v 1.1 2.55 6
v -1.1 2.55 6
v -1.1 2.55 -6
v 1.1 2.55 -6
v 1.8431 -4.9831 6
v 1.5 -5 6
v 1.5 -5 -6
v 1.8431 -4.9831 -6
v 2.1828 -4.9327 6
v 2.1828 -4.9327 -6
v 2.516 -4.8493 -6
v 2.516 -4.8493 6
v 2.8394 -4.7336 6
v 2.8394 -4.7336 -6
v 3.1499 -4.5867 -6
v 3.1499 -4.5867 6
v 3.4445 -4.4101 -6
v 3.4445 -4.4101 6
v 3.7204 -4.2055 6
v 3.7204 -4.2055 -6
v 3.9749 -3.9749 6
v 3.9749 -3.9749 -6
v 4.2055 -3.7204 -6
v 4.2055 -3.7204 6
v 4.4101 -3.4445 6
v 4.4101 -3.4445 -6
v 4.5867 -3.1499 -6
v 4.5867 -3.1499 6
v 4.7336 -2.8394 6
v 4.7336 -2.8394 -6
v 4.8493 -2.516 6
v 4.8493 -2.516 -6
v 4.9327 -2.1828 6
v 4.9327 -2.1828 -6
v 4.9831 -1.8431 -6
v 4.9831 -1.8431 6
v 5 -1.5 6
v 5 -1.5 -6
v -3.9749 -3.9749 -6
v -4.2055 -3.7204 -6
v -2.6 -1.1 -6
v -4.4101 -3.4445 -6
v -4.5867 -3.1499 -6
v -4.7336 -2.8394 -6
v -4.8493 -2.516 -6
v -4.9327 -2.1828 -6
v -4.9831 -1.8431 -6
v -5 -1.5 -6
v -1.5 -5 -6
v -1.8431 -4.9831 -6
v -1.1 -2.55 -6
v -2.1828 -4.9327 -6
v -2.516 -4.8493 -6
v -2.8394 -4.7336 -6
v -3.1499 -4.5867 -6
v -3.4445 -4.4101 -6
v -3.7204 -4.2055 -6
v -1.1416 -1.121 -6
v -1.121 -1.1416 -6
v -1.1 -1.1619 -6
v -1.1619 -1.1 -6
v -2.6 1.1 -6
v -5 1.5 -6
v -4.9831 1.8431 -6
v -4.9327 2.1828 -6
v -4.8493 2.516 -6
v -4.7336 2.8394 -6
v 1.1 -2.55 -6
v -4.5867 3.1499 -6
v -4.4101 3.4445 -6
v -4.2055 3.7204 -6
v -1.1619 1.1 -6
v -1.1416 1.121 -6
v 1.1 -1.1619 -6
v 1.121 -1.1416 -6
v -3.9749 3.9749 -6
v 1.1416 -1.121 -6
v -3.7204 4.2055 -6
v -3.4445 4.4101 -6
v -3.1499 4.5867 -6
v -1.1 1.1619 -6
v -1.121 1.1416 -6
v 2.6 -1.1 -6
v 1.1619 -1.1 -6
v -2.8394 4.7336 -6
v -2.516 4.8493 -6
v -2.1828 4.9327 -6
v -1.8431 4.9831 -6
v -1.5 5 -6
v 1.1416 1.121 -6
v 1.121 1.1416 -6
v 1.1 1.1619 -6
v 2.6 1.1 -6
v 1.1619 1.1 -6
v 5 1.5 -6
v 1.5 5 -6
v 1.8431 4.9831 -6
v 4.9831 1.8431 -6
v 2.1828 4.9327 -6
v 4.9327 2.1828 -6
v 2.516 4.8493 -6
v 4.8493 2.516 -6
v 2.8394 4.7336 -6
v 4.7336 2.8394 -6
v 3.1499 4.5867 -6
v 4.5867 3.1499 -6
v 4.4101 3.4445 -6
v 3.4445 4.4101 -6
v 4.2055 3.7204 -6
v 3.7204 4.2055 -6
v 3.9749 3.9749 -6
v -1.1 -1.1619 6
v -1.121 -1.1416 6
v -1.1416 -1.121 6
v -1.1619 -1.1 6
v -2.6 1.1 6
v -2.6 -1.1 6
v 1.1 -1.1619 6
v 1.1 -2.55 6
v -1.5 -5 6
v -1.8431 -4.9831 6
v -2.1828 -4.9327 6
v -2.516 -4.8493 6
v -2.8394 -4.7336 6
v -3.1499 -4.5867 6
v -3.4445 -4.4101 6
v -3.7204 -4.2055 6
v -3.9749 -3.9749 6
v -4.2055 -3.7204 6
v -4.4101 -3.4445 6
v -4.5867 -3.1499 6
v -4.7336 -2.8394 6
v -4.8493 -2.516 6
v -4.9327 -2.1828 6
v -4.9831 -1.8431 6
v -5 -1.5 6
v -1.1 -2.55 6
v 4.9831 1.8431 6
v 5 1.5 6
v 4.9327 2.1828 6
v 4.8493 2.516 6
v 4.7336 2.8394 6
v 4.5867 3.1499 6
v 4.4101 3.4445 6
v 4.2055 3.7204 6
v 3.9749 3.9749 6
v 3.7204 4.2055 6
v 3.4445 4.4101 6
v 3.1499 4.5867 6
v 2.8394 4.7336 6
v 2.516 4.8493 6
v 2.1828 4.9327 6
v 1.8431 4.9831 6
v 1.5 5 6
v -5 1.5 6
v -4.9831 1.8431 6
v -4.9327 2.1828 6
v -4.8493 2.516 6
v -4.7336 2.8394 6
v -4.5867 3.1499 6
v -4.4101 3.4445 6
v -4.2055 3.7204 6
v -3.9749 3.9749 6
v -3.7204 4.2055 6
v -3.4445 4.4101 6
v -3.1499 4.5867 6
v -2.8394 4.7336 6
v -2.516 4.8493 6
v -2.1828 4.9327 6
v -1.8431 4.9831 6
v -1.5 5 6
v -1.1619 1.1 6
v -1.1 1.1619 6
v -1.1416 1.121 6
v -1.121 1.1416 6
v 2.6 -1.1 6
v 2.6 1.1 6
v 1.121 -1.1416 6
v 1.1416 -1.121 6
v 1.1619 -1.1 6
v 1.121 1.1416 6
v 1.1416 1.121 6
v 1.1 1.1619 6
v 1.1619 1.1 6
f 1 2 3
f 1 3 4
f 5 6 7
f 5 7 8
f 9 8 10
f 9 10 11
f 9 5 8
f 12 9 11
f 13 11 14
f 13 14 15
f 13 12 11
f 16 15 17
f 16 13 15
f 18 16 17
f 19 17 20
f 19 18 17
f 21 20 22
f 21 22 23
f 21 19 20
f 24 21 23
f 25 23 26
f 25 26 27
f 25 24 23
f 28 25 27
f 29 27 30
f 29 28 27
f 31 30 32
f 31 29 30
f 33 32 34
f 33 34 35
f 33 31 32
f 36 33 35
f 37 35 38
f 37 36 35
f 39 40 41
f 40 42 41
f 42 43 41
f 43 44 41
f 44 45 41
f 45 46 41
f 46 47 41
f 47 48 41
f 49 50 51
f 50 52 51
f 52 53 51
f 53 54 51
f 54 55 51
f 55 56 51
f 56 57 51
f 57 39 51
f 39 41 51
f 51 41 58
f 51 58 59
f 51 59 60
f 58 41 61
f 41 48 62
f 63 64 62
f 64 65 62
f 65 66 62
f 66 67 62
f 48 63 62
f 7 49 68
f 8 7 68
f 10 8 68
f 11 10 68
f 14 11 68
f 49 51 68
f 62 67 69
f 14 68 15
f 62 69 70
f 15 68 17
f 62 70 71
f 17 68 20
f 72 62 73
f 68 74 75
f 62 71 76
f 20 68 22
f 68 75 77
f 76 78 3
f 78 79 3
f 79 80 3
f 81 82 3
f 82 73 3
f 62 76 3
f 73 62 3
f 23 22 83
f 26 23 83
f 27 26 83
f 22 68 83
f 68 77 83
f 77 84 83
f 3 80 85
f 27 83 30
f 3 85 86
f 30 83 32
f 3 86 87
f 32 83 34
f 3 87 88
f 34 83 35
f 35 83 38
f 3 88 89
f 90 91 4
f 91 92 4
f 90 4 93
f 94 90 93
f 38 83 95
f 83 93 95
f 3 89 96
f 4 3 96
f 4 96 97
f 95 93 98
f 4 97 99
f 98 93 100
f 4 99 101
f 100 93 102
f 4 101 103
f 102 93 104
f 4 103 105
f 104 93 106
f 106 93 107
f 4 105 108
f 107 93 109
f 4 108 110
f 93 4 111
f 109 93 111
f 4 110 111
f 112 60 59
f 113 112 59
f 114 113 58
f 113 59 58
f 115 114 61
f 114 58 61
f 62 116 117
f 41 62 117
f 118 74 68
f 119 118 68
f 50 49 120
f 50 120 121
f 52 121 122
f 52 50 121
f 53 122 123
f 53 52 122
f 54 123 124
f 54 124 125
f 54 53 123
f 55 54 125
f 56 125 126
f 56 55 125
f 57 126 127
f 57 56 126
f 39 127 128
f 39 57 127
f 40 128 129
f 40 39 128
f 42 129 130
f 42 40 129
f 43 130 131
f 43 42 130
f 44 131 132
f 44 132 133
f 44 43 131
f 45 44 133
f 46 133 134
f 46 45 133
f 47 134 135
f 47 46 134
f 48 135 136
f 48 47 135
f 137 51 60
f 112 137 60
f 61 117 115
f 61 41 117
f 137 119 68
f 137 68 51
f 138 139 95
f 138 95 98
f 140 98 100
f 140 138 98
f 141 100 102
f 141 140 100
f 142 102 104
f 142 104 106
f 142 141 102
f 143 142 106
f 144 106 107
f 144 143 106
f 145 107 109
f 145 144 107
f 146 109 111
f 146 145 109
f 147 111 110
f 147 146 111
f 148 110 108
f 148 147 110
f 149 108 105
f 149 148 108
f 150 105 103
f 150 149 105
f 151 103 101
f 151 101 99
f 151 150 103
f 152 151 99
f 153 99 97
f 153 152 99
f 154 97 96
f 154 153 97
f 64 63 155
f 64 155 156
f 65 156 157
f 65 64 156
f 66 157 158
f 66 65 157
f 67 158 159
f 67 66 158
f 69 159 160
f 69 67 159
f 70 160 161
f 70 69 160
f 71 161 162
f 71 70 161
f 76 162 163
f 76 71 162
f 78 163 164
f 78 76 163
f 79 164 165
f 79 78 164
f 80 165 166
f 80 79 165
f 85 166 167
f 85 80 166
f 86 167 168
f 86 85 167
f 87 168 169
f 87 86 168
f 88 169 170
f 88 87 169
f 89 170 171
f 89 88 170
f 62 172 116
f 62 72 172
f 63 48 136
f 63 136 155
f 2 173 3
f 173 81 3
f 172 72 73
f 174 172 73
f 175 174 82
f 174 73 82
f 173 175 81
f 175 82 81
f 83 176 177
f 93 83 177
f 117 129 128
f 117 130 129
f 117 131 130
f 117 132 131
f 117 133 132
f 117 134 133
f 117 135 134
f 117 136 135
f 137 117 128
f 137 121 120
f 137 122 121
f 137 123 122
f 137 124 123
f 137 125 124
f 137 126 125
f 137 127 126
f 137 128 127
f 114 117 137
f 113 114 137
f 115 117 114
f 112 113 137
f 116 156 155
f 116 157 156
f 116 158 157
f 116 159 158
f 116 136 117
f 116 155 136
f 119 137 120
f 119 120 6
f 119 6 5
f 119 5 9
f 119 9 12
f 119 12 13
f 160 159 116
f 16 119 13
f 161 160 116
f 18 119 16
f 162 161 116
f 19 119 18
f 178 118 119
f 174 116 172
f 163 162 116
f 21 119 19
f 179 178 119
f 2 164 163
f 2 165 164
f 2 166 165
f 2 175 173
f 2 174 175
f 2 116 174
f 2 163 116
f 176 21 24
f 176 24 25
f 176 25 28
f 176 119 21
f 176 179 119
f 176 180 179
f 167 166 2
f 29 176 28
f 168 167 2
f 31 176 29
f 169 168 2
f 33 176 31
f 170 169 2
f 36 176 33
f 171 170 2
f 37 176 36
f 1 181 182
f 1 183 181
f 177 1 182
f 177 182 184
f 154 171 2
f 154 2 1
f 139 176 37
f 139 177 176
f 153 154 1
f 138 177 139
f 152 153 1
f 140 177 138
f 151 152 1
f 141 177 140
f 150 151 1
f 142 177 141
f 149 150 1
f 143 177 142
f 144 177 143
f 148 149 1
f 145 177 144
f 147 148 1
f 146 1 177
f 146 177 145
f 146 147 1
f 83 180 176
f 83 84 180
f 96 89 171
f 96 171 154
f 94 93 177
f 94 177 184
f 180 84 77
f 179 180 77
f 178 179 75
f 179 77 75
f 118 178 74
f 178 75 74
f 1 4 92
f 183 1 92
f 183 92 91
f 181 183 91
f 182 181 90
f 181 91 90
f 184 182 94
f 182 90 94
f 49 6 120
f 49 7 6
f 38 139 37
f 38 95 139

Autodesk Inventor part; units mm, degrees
ref_plane "YZ Plane" through (0, 0, 0) normal (1, 0, 0) x (0, 1, 0)
ref_plane "XZ Plane" through (0, 0, 0) normal (0, 1, 0) x (-1, 0, 0)
ref_plane "XY Plane" through (0, 0, 0) normal (0, 0, 1) x (1, 0, 0)
sketch "Boceto2" plane through (0, 0, 0) normal (0, 0, 1) x (1, 0, 0)
  circle A0 centre (0, 0) radius 1.6
  line L0 (1.1, -2.55) -> (-1.1, -2.55)
  line L1 (-1.1, -2.55) -> (-1.1, 2.55)
  line L2 (-1.1, 2.55) -> (1.1, 2.55)
  line L3 (1.1, 2.55) -> (1.1, -2.55)
  line L4 (1.1, -2.55) -> (-1.1, 2.55) construction
  line L5 (-1.1, -2.55) -> (1.1, 2.55) construction
  line L6 (-2.6, -1.1) -> (2.6, -1.1)
  line L7 (2.6, -1.1) -> (2.6, 1.1)
  line L8 (2.6, 1.1) -> (-2.6, 1.1)
  line L9 (-2.6, 1.1) -> (-2.6, -1.1)
  line L10 (-2.6, -1.1) -> (2.6, 1.1) construction
  line L11 (2.6, -1.1) -> (-2.6, 1.1) construction
  line L12 (5, -5) -> (-5, -5)
  line L13 (-5, -5) -> (-5, 5)
  line L14 (-5, 5) -> (5, 5)
  line L15 (5, 5) -> (5, -5)
  line L16 (5, -5) -> (-5, 5) construction
  line L17 (-5, -5) -> (5, 5) construction
  point P0 (-1.1, -1.1619)
  point P1 (-1.1619, -1.1)
  point P2 (-1.1619, 1.1)
  point P3 (-1.1, 1.1619)
  point P4 (1.1, 1.1619)
  point P5 (1.1619, 1.1)
  point P6 (1.1619, -1.1)
  point P7 (1.1, -1.1619)
  dimension "d0" = 3.2
  dimension "d1" = 2.2
  dimension "d2" = 5.1
  dimension "d3" = 2.2
  dimension "d4" = 5.2
  dimension "d5" = 10
  dimension "d6" = 10
extrude "Extrusión1" add sketch "Boceto2" along normal mid plane 12
fillet "Empalme1" radius 3.5 4 edges at (5, 5, 0) (-5, 5, 0) (5, -5, 0) (-5, -5, 0)
properties part number "Acoplador"
